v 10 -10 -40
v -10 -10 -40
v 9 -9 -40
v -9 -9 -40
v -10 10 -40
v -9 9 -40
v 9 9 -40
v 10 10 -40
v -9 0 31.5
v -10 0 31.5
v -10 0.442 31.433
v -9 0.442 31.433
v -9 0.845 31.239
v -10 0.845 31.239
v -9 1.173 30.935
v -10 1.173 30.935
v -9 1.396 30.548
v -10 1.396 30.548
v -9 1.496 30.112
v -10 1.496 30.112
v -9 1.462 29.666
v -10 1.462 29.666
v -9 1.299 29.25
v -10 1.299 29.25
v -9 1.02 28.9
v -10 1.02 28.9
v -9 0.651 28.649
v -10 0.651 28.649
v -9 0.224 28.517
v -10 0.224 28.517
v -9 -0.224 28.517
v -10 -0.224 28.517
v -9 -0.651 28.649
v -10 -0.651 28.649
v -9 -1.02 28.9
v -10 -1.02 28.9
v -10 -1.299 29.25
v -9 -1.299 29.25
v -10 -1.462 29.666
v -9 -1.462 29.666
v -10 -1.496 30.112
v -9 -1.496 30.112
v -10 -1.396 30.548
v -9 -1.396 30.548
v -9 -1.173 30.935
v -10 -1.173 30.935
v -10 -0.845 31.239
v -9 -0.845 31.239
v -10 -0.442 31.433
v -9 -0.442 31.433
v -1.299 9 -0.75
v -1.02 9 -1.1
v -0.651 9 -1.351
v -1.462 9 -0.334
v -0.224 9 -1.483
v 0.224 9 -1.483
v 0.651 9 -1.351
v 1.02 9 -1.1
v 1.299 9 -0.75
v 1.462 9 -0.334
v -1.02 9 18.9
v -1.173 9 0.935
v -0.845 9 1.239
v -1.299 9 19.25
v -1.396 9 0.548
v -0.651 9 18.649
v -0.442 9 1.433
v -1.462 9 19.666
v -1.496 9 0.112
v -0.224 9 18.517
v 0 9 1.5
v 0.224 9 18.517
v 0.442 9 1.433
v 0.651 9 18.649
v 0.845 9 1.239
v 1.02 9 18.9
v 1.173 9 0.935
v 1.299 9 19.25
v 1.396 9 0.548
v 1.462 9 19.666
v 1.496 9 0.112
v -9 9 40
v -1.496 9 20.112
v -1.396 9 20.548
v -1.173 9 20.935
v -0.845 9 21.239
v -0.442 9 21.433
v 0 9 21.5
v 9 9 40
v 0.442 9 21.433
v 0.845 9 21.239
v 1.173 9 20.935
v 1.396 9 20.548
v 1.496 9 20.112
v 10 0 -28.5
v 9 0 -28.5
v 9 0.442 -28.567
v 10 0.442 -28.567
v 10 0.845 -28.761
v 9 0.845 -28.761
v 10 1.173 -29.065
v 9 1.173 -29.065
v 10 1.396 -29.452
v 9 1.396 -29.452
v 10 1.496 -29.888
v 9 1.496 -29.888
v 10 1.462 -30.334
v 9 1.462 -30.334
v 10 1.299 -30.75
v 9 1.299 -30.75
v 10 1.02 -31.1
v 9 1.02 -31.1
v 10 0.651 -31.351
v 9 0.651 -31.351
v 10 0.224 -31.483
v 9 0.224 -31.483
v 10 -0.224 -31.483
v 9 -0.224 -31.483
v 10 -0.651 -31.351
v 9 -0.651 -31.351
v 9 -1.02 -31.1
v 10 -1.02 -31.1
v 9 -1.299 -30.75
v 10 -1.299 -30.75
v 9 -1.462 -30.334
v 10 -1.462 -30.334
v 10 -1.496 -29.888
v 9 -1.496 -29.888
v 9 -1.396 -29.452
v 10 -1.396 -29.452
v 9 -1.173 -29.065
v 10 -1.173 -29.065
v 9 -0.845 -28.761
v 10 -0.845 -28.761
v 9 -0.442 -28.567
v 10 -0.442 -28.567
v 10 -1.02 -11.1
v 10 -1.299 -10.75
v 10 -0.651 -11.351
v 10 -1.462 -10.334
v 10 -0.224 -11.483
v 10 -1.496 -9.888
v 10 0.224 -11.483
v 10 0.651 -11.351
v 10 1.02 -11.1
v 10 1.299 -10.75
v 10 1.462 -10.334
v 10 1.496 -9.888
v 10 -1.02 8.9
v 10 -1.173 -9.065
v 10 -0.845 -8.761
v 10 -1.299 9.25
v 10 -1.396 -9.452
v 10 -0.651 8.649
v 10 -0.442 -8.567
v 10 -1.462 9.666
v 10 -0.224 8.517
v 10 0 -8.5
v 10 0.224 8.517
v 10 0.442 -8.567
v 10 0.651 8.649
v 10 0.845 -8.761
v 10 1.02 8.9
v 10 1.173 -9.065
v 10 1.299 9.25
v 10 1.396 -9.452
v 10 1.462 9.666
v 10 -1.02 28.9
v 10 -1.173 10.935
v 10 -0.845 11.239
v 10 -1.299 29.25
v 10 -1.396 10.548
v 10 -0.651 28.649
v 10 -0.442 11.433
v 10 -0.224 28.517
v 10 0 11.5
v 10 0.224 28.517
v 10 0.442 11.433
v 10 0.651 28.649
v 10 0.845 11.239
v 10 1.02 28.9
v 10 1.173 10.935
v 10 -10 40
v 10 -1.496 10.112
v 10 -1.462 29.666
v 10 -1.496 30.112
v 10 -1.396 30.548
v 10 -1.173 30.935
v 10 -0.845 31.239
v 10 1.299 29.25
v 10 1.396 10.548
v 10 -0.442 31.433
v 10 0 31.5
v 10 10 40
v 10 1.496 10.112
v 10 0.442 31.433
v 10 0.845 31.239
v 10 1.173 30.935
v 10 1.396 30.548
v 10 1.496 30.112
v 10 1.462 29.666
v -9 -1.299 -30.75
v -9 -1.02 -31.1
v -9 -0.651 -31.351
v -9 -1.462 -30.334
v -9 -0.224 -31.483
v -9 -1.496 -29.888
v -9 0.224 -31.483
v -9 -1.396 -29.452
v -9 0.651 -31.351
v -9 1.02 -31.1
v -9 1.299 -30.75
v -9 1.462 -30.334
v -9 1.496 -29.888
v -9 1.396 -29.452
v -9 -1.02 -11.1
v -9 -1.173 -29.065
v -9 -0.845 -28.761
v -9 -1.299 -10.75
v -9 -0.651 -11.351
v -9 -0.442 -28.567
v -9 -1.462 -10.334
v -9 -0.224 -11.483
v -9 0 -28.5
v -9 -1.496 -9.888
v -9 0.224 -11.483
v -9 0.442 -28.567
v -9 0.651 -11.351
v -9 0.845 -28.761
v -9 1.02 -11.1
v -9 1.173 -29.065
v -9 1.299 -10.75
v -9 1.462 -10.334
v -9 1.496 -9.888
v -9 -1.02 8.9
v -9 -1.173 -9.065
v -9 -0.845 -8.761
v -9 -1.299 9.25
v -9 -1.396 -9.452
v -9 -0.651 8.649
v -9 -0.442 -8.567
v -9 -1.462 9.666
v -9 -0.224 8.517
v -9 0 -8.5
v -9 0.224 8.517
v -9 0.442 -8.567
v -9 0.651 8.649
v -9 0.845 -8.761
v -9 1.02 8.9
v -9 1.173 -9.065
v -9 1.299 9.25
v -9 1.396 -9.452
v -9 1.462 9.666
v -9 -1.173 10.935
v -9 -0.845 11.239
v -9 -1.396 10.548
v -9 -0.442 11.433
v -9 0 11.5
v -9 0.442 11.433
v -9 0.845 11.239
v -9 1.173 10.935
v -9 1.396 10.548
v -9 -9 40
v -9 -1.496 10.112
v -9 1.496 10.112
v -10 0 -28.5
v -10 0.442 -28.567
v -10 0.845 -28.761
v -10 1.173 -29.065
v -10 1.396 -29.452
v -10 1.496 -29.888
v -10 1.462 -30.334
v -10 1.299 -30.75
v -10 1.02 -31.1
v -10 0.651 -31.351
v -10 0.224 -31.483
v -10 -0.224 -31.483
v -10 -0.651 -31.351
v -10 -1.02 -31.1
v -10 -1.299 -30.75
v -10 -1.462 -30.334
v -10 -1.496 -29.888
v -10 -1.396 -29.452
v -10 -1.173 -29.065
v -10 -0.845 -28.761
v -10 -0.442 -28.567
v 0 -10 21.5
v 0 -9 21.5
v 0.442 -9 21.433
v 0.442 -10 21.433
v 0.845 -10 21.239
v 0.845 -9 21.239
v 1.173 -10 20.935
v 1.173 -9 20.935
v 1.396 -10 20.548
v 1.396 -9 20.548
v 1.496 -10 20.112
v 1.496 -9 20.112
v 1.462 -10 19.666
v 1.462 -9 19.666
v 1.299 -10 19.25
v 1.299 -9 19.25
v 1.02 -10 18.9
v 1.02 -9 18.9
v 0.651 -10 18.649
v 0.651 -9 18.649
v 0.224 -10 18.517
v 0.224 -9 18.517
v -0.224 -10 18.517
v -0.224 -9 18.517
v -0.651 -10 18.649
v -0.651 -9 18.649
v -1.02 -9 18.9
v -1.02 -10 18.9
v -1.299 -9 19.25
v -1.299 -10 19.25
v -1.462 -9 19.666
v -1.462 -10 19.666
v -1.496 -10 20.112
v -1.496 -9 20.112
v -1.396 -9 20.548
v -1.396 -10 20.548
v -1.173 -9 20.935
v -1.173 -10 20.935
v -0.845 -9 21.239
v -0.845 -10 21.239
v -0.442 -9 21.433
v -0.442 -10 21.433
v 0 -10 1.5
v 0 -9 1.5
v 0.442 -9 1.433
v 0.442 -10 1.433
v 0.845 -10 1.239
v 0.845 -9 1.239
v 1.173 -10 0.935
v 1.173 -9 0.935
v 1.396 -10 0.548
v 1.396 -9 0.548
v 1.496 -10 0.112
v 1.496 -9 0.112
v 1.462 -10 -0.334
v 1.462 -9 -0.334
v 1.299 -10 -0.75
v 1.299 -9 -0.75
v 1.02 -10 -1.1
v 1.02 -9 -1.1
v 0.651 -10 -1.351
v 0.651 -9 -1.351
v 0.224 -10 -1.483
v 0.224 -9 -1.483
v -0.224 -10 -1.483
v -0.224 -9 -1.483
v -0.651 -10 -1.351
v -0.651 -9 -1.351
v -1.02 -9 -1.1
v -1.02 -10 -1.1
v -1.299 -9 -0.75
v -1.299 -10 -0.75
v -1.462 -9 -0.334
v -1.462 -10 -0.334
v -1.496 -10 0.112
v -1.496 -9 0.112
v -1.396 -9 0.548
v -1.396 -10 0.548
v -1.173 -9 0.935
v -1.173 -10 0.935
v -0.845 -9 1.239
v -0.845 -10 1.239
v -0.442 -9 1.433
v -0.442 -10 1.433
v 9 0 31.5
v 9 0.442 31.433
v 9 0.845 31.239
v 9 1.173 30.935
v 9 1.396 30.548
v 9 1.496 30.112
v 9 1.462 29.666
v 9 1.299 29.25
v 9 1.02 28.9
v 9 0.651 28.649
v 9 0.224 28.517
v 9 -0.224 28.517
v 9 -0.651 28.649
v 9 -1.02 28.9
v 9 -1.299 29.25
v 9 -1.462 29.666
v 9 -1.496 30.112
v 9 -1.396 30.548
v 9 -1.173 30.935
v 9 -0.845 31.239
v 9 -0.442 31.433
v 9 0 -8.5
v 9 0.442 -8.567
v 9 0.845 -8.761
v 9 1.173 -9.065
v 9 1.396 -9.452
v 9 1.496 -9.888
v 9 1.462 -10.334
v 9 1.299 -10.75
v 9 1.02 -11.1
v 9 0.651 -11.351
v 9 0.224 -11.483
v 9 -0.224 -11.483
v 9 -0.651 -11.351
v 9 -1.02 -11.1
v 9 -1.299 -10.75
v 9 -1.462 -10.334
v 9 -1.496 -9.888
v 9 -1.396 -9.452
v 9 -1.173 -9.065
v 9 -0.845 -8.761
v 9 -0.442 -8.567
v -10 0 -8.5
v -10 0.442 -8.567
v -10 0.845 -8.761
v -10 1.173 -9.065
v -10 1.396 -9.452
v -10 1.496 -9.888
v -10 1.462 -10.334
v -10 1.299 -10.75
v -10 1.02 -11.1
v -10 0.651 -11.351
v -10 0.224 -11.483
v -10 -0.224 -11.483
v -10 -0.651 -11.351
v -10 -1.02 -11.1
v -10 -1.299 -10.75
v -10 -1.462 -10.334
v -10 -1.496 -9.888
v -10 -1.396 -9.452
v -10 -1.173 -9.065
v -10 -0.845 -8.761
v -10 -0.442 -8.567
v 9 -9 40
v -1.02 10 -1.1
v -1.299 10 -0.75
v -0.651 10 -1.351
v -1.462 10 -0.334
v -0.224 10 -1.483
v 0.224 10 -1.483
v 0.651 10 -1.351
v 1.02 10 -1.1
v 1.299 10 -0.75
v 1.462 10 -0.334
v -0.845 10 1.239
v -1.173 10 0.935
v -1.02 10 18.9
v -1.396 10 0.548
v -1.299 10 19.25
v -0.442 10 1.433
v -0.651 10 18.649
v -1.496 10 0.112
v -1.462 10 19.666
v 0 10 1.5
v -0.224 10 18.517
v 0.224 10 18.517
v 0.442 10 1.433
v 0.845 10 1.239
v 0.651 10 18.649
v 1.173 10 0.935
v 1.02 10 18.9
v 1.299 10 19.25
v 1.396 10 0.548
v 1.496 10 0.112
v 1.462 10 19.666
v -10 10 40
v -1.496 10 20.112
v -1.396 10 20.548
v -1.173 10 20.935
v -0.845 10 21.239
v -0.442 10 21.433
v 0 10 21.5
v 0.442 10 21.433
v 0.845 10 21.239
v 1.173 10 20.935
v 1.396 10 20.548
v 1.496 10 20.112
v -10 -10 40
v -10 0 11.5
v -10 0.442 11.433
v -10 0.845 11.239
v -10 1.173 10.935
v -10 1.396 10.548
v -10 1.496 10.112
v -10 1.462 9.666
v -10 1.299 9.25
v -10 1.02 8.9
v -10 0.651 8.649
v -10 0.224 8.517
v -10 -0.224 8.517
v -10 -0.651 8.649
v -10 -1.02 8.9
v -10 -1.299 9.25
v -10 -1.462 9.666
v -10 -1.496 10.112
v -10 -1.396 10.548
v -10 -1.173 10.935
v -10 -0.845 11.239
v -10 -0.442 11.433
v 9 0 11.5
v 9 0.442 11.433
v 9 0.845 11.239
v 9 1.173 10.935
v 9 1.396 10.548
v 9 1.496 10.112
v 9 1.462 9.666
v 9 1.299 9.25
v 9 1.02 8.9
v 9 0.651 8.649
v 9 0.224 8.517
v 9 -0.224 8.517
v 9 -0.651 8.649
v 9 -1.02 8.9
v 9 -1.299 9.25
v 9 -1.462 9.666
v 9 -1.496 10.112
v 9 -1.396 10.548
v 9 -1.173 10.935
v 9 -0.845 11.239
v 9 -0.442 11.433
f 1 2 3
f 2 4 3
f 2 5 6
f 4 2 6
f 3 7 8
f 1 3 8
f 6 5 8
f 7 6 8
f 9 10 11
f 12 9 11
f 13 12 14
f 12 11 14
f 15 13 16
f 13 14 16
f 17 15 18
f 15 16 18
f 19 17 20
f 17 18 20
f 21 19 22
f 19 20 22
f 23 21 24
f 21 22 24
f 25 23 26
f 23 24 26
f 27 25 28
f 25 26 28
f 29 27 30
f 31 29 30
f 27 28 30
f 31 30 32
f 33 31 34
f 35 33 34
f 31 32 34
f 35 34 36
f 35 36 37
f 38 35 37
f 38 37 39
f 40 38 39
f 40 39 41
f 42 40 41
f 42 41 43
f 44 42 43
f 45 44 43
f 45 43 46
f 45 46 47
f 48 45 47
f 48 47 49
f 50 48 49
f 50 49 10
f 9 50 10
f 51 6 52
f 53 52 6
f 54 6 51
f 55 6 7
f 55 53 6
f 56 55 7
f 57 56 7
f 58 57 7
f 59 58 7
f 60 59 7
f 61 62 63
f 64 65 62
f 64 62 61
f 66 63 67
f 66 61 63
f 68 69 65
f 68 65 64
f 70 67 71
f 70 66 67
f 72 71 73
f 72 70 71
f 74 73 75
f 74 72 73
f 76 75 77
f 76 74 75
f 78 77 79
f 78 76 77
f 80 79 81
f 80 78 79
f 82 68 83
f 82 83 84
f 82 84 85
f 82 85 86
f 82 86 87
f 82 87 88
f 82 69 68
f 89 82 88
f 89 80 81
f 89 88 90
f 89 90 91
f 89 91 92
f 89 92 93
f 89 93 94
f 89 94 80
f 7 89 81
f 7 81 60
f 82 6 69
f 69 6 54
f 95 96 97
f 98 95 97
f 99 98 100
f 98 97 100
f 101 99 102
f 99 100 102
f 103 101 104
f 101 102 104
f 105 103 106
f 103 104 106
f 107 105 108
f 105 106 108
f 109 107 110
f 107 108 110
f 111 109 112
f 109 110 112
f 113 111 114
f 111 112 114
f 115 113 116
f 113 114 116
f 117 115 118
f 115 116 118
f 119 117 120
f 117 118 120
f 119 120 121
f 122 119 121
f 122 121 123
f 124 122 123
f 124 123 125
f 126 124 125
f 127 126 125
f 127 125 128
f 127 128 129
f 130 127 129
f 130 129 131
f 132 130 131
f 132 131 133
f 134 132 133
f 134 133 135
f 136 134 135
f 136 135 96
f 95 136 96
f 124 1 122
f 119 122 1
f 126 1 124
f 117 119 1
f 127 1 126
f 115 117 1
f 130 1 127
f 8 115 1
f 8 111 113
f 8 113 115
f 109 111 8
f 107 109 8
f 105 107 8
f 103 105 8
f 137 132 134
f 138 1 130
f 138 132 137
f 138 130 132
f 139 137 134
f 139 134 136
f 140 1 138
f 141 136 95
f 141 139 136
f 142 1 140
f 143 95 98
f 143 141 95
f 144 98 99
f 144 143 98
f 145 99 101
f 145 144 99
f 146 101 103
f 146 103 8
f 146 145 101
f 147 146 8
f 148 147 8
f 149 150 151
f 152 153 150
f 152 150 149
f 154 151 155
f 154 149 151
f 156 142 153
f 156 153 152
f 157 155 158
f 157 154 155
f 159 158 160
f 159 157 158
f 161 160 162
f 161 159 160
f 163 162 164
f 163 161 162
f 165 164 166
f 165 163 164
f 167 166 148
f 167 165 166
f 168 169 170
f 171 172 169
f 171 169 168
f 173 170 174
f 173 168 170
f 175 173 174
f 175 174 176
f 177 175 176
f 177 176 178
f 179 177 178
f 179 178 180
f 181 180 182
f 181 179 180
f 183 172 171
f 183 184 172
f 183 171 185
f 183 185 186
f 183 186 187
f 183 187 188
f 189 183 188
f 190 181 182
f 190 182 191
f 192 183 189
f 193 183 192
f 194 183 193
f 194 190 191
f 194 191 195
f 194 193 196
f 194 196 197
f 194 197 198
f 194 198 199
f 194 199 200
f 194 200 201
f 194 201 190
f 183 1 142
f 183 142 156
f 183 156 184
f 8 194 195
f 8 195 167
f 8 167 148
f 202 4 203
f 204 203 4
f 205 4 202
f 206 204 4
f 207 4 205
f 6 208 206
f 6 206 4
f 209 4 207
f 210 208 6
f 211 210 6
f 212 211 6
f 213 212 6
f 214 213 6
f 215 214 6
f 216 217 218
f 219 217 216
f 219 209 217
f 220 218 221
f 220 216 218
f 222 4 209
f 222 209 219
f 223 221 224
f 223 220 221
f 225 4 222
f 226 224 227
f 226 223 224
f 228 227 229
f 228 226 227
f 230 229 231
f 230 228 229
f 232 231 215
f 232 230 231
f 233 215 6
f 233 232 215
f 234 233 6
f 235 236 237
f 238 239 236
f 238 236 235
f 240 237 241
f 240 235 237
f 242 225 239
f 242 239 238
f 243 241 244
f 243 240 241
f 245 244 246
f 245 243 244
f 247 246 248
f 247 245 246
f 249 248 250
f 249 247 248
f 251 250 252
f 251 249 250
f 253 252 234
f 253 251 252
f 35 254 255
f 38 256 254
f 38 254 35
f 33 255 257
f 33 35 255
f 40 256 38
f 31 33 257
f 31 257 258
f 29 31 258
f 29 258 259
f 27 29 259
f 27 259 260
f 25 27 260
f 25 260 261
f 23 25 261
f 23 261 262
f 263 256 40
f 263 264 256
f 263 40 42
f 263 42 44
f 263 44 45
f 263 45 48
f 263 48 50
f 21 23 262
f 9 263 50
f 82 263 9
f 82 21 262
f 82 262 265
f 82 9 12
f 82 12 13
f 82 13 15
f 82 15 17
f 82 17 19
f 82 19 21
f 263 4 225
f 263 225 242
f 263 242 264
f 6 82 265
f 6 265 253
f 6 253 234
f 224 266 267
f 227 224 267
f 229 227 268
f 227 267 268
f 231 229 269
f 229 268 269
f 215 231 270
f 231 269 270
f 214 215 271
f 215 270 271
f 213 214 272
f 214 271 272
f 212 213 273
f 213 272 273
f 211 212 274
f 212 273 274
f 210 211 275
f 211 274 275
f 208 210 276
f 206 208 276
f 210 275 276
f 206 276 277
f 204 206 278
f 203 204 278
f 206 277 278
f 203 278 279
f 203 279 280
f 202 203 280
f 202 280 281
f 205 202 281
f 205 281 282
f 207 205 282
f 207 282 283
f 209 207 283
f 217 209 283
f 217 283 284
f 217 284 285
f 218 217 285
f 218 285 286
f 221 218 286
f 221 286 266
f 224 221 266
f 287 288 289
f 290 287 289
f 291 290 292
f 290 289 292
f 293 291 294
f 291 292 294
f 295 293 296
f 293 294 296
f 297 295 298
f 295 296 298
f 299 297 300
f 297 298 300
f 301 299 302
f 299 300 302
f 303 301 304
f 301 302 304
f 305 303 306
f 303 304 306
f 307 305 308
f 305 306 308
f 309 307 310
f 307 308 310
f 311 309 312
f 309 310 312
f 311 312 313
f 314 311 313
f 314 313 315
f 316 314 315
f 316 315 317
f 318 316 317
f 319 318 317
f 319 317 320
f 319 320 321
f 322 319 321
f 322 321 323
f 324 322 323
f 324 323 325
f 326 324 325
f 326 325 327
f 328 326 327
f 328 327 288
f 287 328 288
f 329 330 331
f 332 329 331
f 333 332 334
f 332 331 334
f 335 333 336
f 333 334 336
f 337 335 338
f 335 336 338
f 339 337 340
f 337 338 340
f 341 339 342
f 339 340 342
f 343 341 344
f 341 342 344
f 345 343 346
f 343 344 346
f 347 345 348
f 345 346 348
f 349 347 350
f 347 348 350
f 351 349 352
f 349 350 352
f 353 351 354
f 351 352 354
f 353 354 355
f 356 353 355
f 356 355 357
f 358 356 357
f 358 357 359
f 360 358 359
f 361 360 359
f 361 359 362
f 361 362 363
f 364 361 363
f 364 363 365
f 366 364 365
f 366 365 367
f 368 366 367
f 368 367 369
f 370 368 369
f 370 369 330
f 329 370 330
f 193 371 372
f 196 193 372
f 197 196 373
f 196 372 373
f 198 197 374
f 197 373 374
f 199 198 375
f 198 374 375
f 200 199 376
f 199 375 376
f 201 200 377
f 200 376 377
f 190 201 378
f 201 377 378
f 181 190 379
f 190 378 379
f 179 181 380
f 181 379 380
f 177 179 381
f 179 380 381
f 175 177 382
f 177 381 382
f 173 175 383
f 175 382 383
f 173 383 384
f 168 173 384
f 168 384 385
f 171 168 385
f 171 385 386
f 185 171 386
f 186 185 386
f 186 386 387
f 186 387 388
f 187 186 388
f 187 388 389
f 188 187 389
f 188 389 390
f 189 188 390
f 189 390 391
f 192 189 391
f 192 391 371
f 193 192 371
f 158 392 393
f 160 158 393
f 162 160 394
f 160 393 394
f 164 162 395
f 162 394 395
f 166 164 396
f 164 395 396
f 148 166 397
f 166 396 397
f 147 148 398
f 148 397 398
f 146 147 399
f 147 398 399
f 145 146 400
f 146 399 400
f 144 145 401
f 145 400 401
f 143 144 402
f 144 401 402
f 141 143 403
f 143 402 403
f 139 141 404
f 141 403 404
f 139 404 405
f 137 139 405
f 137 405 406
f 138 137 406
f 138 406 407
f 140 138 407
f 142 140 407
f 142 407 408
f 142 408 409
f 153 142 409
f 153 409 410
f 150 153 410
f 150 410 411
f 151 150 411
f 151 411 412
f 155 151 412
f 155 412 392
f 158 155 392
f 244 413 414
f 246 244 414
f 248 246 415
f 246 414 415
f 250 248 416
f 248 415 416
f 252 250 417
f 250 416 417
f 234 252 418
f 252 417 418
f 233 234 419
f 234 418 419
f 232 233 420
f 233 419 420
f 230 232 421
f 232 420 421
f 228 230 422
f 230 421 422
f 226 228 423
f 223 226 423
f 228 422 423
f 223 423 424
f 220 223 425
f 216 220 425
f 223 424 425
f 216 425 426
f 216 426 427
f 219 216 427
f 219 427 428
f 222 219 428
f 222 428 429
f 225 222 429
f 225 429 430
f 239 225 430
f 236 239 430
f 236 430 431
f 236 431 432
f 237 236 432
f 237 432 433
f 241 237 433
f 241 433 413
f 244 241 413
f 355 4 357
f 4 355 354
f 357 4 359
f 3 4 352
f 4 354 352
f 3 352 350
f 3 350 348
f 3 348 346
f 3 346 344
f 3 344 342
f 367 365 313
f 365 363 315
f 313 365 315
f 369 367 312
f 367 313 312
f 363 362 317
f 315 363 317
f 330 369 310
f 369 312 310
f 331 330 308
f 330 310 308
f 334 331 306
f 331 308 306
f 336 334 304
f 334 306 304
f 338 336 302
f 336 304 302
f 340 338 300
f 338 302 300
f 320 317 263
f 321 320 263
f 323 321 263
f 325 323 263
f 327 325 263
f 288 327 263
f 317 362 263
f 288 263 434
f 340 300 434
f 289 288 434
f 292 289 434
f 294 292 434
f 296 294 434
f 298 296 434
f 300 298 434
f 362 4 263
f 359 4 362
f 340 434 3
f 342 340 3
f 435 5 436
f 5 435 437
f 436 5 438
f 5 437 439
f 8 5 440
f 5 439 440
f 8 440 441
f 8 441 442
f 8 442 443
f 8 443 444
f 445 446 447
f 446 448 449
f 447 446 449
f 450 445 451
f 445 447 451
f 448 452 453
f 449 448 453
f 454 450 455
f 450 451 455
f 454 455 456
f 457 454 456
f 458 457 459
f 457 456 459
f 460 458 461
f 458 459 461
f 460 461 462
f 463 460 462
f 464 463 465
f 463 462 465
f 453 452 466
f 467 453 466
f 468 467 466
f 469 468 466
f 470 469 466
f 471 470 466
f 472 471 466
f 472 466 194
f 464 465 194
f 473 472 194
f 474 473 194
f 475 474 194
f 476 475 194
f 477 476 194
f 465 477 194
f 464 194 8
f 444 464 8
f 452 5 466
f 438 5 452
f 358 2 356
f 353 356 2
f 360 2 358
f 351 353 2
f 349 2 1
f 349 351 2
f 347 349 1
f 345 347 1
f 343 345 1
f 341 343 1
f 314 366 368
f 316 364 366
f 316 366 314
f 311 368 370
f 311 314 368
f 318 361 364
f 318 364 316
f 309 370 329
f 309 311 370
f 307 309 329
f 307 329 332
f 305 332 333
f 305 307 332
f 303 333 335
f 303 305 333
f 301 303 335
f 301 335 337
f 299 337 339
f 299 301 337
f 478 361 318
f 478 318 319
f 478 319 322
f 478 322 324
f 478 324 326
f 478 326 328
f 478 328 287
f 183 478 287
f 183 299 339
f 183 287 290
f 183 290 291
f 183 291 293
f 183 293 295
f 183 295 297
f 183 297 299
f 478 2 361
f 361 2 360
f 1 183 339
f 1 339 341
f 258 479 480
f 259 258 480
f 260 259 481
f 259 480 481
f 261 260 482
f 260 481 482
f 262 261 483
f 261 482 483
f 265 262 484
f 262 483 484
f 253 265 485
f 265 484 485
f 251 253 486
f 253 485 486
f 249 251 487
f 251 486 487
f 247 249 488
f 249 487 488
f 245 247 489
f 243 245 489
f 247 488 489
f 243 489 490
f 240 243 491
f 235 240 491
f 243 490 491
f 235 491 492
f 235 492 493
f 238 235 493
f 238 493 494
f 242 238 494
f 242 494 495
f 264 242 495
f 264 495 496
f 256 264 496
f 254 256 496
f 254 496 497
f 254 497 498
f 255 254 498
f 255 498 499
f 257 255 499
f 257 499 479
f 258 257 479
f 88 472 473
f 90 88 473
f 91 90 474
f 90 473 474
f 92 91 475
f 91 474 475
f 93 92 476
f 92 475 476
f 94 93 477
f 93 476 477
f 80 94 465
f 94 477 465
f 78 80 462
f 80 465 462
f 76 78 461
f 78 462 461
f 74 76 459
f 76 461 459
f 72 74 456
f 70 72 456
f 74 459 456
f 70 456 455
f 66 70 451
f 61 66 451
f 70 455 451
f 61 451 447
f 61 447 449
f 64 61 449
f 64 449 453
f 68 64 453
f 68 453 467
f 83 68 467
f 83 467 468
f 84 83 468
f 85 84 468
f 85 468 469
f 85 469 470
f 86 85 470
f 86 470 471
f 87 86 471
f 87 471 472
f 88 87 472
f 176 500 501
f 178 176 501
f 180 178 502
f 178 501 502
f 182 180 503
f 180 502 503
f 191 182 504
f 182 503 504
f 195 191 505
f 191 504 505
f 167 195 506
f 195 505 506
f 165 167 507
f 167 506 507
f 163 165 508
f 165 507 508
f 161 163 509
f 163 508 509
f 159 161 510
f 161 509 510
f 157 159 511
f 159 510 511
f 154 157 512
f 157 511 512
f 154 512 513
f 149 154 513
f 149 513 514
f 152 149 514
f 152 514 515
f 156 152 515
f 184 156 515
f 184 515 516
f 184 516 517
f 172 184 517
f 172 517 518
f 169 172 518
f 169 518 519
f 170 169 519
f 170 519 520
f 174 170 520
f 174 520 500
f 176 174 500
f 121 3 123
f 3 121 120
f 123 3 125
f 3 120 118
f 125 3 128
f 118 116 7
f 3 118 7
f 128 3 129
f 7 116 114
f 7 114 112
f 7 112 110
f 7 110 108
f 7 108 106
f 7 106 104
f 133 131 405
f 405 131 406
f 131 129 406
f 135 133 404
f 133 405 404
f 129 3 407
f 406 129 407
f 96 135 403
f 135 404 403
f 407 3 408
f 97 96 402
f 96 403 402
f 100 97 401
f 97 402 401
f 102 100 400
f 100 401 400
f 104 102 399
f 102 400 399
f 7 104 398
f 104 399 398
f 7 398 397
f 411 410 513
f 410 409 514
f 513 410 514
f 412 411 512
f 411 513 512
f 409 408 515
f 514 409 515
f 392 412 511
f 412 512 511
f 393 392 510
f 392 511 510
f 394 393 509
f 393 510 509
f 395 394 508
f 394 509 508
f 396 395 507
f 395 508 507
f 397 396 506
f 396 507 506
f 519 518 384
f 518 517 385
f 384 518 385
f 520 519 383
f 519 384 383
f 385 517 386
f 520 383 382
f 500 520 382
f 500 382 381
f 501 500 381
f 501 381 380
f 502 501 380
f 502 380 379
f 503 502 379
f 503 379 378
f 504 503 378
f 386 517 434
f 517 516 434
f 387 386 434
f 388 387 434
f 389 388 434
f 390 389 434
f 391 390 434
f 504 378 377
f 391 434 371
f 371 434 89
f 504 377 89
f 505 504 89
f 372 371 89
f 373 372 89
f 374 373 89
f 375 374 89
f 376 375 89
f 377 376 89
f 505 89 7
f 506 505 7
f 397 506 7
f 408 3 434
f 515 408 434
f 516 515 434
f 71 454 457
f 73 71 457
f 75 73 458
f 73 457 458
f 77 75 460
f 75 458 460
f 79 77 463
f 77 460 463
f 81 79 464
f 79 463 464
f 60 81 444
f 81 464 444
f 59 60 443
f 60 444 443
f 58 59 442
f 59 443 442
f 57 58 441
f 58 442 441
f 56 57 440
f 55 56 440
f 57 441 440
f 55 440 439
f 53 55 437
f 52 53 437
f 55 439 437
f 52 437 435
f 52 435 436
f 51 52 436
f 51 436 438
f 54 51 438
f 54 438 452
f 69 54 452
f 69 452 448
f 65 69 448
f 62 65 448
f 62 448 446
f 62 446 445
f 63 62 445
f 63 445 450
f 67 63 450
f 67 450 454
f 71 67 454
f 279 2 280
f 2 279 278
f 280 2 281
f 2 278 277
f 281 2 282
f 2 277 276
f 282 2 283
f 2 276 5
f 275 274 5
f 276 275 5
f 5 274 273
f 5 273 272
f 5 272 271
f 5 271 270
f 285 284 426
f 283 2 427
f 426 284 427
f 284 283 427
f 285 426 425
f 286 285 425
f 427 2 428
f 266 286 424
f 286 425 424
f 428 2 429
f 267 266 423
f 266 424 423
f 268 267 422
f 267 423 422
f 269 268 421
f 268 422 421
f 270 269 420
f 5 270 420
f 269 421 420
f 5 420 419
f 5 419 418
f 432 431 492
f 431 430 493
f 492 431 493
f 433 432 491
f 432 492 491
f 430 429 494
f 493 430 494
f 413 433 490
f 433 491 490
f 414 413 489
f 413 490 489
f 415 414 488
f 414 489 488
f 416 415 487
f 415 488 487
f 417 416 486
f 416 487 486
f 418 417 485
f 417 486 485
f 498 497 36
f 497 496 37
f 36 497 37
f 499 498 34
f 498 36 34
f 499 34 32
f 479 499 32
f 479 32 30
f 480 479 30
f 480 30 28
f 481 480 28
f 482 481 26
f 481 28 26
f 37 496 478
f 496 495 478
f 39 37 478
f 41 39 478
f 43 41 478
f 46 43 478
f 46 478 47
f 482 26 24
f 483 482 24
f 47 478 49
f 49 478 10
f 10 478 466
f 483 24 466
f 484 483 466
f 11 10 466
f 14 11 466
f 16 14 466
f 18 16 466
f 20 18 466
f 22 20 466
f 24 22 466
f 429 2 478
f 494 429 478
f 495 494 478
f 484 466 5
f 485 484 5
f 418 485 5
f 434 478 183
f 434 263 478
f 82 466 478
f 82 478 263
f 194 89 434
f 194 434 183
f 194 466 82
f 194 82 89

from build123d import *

# Parameters (mm, degrees)
SKETCH_1_W          = 20
SKETCH_1_H          = 20
SKETCH_1_W_2        = 18
SKETCH_1_H_2        = 18
EXTRUDE_1_DEPTH     = 40
SKETCH_2_R          = 1.5
CUT_EXTRUDE_1_DEPTH = 200
SKETCH_3_R          = 1.5
CUT_EXTRUDE_2_DEPTH = 40


with BuildPart() as part:
    # 草图1 → 凸台-拉伸1 (new, symmetric)
    with BuildSketch(Plane.XY):
        Rectangle(SKETCH_1_W, SKETCH_1_H)
        Rectangle(SKETCH_1_W_2, SKETCH_1_H_2, mode=Mode.SUBTRACT)
    extrude(amount=EXTRUDE_1_DEPTH, both=True)

    # 草图2 → 切除-拉伸1 (cut)
    with BuildSketch(Plane(origin=(0, 10, 0), x_dir=(1, 0, 0), z_dir=(0, 1, 0))):
        with Locations(Location((0, -20, 0), (0, 0, 270))):
            Circle(SKETCH_2_R)
        with Locations(Location((0, 0, 0), (0, 0, 270))):
            Circle(SKETCH_2_R)
    extrude(amount=-CUT_EXTRUDE_1_DEPTH, mode=Mode.SUBTRACT)

    # 草图3 → 切除-拉伸2 (cut)
    with BuildSketch(Plane.ZY.offset(10)):
        with Locations((10, 0)):
            Circle(SKETCH_3_R)
        with Locations((-10, 0)):
            Circle(SKETCH_3_R)
        with Locations((30, 0)):
            Circle(SKETCH_3_R)
        with Locations((-30, 0)):
            Circle(SKETCH_3_R)
    extrude(amount=-CUT_EXTRUDE_2_DEPTH, mode=Mode.SUBTRACT)


solid = part.part
